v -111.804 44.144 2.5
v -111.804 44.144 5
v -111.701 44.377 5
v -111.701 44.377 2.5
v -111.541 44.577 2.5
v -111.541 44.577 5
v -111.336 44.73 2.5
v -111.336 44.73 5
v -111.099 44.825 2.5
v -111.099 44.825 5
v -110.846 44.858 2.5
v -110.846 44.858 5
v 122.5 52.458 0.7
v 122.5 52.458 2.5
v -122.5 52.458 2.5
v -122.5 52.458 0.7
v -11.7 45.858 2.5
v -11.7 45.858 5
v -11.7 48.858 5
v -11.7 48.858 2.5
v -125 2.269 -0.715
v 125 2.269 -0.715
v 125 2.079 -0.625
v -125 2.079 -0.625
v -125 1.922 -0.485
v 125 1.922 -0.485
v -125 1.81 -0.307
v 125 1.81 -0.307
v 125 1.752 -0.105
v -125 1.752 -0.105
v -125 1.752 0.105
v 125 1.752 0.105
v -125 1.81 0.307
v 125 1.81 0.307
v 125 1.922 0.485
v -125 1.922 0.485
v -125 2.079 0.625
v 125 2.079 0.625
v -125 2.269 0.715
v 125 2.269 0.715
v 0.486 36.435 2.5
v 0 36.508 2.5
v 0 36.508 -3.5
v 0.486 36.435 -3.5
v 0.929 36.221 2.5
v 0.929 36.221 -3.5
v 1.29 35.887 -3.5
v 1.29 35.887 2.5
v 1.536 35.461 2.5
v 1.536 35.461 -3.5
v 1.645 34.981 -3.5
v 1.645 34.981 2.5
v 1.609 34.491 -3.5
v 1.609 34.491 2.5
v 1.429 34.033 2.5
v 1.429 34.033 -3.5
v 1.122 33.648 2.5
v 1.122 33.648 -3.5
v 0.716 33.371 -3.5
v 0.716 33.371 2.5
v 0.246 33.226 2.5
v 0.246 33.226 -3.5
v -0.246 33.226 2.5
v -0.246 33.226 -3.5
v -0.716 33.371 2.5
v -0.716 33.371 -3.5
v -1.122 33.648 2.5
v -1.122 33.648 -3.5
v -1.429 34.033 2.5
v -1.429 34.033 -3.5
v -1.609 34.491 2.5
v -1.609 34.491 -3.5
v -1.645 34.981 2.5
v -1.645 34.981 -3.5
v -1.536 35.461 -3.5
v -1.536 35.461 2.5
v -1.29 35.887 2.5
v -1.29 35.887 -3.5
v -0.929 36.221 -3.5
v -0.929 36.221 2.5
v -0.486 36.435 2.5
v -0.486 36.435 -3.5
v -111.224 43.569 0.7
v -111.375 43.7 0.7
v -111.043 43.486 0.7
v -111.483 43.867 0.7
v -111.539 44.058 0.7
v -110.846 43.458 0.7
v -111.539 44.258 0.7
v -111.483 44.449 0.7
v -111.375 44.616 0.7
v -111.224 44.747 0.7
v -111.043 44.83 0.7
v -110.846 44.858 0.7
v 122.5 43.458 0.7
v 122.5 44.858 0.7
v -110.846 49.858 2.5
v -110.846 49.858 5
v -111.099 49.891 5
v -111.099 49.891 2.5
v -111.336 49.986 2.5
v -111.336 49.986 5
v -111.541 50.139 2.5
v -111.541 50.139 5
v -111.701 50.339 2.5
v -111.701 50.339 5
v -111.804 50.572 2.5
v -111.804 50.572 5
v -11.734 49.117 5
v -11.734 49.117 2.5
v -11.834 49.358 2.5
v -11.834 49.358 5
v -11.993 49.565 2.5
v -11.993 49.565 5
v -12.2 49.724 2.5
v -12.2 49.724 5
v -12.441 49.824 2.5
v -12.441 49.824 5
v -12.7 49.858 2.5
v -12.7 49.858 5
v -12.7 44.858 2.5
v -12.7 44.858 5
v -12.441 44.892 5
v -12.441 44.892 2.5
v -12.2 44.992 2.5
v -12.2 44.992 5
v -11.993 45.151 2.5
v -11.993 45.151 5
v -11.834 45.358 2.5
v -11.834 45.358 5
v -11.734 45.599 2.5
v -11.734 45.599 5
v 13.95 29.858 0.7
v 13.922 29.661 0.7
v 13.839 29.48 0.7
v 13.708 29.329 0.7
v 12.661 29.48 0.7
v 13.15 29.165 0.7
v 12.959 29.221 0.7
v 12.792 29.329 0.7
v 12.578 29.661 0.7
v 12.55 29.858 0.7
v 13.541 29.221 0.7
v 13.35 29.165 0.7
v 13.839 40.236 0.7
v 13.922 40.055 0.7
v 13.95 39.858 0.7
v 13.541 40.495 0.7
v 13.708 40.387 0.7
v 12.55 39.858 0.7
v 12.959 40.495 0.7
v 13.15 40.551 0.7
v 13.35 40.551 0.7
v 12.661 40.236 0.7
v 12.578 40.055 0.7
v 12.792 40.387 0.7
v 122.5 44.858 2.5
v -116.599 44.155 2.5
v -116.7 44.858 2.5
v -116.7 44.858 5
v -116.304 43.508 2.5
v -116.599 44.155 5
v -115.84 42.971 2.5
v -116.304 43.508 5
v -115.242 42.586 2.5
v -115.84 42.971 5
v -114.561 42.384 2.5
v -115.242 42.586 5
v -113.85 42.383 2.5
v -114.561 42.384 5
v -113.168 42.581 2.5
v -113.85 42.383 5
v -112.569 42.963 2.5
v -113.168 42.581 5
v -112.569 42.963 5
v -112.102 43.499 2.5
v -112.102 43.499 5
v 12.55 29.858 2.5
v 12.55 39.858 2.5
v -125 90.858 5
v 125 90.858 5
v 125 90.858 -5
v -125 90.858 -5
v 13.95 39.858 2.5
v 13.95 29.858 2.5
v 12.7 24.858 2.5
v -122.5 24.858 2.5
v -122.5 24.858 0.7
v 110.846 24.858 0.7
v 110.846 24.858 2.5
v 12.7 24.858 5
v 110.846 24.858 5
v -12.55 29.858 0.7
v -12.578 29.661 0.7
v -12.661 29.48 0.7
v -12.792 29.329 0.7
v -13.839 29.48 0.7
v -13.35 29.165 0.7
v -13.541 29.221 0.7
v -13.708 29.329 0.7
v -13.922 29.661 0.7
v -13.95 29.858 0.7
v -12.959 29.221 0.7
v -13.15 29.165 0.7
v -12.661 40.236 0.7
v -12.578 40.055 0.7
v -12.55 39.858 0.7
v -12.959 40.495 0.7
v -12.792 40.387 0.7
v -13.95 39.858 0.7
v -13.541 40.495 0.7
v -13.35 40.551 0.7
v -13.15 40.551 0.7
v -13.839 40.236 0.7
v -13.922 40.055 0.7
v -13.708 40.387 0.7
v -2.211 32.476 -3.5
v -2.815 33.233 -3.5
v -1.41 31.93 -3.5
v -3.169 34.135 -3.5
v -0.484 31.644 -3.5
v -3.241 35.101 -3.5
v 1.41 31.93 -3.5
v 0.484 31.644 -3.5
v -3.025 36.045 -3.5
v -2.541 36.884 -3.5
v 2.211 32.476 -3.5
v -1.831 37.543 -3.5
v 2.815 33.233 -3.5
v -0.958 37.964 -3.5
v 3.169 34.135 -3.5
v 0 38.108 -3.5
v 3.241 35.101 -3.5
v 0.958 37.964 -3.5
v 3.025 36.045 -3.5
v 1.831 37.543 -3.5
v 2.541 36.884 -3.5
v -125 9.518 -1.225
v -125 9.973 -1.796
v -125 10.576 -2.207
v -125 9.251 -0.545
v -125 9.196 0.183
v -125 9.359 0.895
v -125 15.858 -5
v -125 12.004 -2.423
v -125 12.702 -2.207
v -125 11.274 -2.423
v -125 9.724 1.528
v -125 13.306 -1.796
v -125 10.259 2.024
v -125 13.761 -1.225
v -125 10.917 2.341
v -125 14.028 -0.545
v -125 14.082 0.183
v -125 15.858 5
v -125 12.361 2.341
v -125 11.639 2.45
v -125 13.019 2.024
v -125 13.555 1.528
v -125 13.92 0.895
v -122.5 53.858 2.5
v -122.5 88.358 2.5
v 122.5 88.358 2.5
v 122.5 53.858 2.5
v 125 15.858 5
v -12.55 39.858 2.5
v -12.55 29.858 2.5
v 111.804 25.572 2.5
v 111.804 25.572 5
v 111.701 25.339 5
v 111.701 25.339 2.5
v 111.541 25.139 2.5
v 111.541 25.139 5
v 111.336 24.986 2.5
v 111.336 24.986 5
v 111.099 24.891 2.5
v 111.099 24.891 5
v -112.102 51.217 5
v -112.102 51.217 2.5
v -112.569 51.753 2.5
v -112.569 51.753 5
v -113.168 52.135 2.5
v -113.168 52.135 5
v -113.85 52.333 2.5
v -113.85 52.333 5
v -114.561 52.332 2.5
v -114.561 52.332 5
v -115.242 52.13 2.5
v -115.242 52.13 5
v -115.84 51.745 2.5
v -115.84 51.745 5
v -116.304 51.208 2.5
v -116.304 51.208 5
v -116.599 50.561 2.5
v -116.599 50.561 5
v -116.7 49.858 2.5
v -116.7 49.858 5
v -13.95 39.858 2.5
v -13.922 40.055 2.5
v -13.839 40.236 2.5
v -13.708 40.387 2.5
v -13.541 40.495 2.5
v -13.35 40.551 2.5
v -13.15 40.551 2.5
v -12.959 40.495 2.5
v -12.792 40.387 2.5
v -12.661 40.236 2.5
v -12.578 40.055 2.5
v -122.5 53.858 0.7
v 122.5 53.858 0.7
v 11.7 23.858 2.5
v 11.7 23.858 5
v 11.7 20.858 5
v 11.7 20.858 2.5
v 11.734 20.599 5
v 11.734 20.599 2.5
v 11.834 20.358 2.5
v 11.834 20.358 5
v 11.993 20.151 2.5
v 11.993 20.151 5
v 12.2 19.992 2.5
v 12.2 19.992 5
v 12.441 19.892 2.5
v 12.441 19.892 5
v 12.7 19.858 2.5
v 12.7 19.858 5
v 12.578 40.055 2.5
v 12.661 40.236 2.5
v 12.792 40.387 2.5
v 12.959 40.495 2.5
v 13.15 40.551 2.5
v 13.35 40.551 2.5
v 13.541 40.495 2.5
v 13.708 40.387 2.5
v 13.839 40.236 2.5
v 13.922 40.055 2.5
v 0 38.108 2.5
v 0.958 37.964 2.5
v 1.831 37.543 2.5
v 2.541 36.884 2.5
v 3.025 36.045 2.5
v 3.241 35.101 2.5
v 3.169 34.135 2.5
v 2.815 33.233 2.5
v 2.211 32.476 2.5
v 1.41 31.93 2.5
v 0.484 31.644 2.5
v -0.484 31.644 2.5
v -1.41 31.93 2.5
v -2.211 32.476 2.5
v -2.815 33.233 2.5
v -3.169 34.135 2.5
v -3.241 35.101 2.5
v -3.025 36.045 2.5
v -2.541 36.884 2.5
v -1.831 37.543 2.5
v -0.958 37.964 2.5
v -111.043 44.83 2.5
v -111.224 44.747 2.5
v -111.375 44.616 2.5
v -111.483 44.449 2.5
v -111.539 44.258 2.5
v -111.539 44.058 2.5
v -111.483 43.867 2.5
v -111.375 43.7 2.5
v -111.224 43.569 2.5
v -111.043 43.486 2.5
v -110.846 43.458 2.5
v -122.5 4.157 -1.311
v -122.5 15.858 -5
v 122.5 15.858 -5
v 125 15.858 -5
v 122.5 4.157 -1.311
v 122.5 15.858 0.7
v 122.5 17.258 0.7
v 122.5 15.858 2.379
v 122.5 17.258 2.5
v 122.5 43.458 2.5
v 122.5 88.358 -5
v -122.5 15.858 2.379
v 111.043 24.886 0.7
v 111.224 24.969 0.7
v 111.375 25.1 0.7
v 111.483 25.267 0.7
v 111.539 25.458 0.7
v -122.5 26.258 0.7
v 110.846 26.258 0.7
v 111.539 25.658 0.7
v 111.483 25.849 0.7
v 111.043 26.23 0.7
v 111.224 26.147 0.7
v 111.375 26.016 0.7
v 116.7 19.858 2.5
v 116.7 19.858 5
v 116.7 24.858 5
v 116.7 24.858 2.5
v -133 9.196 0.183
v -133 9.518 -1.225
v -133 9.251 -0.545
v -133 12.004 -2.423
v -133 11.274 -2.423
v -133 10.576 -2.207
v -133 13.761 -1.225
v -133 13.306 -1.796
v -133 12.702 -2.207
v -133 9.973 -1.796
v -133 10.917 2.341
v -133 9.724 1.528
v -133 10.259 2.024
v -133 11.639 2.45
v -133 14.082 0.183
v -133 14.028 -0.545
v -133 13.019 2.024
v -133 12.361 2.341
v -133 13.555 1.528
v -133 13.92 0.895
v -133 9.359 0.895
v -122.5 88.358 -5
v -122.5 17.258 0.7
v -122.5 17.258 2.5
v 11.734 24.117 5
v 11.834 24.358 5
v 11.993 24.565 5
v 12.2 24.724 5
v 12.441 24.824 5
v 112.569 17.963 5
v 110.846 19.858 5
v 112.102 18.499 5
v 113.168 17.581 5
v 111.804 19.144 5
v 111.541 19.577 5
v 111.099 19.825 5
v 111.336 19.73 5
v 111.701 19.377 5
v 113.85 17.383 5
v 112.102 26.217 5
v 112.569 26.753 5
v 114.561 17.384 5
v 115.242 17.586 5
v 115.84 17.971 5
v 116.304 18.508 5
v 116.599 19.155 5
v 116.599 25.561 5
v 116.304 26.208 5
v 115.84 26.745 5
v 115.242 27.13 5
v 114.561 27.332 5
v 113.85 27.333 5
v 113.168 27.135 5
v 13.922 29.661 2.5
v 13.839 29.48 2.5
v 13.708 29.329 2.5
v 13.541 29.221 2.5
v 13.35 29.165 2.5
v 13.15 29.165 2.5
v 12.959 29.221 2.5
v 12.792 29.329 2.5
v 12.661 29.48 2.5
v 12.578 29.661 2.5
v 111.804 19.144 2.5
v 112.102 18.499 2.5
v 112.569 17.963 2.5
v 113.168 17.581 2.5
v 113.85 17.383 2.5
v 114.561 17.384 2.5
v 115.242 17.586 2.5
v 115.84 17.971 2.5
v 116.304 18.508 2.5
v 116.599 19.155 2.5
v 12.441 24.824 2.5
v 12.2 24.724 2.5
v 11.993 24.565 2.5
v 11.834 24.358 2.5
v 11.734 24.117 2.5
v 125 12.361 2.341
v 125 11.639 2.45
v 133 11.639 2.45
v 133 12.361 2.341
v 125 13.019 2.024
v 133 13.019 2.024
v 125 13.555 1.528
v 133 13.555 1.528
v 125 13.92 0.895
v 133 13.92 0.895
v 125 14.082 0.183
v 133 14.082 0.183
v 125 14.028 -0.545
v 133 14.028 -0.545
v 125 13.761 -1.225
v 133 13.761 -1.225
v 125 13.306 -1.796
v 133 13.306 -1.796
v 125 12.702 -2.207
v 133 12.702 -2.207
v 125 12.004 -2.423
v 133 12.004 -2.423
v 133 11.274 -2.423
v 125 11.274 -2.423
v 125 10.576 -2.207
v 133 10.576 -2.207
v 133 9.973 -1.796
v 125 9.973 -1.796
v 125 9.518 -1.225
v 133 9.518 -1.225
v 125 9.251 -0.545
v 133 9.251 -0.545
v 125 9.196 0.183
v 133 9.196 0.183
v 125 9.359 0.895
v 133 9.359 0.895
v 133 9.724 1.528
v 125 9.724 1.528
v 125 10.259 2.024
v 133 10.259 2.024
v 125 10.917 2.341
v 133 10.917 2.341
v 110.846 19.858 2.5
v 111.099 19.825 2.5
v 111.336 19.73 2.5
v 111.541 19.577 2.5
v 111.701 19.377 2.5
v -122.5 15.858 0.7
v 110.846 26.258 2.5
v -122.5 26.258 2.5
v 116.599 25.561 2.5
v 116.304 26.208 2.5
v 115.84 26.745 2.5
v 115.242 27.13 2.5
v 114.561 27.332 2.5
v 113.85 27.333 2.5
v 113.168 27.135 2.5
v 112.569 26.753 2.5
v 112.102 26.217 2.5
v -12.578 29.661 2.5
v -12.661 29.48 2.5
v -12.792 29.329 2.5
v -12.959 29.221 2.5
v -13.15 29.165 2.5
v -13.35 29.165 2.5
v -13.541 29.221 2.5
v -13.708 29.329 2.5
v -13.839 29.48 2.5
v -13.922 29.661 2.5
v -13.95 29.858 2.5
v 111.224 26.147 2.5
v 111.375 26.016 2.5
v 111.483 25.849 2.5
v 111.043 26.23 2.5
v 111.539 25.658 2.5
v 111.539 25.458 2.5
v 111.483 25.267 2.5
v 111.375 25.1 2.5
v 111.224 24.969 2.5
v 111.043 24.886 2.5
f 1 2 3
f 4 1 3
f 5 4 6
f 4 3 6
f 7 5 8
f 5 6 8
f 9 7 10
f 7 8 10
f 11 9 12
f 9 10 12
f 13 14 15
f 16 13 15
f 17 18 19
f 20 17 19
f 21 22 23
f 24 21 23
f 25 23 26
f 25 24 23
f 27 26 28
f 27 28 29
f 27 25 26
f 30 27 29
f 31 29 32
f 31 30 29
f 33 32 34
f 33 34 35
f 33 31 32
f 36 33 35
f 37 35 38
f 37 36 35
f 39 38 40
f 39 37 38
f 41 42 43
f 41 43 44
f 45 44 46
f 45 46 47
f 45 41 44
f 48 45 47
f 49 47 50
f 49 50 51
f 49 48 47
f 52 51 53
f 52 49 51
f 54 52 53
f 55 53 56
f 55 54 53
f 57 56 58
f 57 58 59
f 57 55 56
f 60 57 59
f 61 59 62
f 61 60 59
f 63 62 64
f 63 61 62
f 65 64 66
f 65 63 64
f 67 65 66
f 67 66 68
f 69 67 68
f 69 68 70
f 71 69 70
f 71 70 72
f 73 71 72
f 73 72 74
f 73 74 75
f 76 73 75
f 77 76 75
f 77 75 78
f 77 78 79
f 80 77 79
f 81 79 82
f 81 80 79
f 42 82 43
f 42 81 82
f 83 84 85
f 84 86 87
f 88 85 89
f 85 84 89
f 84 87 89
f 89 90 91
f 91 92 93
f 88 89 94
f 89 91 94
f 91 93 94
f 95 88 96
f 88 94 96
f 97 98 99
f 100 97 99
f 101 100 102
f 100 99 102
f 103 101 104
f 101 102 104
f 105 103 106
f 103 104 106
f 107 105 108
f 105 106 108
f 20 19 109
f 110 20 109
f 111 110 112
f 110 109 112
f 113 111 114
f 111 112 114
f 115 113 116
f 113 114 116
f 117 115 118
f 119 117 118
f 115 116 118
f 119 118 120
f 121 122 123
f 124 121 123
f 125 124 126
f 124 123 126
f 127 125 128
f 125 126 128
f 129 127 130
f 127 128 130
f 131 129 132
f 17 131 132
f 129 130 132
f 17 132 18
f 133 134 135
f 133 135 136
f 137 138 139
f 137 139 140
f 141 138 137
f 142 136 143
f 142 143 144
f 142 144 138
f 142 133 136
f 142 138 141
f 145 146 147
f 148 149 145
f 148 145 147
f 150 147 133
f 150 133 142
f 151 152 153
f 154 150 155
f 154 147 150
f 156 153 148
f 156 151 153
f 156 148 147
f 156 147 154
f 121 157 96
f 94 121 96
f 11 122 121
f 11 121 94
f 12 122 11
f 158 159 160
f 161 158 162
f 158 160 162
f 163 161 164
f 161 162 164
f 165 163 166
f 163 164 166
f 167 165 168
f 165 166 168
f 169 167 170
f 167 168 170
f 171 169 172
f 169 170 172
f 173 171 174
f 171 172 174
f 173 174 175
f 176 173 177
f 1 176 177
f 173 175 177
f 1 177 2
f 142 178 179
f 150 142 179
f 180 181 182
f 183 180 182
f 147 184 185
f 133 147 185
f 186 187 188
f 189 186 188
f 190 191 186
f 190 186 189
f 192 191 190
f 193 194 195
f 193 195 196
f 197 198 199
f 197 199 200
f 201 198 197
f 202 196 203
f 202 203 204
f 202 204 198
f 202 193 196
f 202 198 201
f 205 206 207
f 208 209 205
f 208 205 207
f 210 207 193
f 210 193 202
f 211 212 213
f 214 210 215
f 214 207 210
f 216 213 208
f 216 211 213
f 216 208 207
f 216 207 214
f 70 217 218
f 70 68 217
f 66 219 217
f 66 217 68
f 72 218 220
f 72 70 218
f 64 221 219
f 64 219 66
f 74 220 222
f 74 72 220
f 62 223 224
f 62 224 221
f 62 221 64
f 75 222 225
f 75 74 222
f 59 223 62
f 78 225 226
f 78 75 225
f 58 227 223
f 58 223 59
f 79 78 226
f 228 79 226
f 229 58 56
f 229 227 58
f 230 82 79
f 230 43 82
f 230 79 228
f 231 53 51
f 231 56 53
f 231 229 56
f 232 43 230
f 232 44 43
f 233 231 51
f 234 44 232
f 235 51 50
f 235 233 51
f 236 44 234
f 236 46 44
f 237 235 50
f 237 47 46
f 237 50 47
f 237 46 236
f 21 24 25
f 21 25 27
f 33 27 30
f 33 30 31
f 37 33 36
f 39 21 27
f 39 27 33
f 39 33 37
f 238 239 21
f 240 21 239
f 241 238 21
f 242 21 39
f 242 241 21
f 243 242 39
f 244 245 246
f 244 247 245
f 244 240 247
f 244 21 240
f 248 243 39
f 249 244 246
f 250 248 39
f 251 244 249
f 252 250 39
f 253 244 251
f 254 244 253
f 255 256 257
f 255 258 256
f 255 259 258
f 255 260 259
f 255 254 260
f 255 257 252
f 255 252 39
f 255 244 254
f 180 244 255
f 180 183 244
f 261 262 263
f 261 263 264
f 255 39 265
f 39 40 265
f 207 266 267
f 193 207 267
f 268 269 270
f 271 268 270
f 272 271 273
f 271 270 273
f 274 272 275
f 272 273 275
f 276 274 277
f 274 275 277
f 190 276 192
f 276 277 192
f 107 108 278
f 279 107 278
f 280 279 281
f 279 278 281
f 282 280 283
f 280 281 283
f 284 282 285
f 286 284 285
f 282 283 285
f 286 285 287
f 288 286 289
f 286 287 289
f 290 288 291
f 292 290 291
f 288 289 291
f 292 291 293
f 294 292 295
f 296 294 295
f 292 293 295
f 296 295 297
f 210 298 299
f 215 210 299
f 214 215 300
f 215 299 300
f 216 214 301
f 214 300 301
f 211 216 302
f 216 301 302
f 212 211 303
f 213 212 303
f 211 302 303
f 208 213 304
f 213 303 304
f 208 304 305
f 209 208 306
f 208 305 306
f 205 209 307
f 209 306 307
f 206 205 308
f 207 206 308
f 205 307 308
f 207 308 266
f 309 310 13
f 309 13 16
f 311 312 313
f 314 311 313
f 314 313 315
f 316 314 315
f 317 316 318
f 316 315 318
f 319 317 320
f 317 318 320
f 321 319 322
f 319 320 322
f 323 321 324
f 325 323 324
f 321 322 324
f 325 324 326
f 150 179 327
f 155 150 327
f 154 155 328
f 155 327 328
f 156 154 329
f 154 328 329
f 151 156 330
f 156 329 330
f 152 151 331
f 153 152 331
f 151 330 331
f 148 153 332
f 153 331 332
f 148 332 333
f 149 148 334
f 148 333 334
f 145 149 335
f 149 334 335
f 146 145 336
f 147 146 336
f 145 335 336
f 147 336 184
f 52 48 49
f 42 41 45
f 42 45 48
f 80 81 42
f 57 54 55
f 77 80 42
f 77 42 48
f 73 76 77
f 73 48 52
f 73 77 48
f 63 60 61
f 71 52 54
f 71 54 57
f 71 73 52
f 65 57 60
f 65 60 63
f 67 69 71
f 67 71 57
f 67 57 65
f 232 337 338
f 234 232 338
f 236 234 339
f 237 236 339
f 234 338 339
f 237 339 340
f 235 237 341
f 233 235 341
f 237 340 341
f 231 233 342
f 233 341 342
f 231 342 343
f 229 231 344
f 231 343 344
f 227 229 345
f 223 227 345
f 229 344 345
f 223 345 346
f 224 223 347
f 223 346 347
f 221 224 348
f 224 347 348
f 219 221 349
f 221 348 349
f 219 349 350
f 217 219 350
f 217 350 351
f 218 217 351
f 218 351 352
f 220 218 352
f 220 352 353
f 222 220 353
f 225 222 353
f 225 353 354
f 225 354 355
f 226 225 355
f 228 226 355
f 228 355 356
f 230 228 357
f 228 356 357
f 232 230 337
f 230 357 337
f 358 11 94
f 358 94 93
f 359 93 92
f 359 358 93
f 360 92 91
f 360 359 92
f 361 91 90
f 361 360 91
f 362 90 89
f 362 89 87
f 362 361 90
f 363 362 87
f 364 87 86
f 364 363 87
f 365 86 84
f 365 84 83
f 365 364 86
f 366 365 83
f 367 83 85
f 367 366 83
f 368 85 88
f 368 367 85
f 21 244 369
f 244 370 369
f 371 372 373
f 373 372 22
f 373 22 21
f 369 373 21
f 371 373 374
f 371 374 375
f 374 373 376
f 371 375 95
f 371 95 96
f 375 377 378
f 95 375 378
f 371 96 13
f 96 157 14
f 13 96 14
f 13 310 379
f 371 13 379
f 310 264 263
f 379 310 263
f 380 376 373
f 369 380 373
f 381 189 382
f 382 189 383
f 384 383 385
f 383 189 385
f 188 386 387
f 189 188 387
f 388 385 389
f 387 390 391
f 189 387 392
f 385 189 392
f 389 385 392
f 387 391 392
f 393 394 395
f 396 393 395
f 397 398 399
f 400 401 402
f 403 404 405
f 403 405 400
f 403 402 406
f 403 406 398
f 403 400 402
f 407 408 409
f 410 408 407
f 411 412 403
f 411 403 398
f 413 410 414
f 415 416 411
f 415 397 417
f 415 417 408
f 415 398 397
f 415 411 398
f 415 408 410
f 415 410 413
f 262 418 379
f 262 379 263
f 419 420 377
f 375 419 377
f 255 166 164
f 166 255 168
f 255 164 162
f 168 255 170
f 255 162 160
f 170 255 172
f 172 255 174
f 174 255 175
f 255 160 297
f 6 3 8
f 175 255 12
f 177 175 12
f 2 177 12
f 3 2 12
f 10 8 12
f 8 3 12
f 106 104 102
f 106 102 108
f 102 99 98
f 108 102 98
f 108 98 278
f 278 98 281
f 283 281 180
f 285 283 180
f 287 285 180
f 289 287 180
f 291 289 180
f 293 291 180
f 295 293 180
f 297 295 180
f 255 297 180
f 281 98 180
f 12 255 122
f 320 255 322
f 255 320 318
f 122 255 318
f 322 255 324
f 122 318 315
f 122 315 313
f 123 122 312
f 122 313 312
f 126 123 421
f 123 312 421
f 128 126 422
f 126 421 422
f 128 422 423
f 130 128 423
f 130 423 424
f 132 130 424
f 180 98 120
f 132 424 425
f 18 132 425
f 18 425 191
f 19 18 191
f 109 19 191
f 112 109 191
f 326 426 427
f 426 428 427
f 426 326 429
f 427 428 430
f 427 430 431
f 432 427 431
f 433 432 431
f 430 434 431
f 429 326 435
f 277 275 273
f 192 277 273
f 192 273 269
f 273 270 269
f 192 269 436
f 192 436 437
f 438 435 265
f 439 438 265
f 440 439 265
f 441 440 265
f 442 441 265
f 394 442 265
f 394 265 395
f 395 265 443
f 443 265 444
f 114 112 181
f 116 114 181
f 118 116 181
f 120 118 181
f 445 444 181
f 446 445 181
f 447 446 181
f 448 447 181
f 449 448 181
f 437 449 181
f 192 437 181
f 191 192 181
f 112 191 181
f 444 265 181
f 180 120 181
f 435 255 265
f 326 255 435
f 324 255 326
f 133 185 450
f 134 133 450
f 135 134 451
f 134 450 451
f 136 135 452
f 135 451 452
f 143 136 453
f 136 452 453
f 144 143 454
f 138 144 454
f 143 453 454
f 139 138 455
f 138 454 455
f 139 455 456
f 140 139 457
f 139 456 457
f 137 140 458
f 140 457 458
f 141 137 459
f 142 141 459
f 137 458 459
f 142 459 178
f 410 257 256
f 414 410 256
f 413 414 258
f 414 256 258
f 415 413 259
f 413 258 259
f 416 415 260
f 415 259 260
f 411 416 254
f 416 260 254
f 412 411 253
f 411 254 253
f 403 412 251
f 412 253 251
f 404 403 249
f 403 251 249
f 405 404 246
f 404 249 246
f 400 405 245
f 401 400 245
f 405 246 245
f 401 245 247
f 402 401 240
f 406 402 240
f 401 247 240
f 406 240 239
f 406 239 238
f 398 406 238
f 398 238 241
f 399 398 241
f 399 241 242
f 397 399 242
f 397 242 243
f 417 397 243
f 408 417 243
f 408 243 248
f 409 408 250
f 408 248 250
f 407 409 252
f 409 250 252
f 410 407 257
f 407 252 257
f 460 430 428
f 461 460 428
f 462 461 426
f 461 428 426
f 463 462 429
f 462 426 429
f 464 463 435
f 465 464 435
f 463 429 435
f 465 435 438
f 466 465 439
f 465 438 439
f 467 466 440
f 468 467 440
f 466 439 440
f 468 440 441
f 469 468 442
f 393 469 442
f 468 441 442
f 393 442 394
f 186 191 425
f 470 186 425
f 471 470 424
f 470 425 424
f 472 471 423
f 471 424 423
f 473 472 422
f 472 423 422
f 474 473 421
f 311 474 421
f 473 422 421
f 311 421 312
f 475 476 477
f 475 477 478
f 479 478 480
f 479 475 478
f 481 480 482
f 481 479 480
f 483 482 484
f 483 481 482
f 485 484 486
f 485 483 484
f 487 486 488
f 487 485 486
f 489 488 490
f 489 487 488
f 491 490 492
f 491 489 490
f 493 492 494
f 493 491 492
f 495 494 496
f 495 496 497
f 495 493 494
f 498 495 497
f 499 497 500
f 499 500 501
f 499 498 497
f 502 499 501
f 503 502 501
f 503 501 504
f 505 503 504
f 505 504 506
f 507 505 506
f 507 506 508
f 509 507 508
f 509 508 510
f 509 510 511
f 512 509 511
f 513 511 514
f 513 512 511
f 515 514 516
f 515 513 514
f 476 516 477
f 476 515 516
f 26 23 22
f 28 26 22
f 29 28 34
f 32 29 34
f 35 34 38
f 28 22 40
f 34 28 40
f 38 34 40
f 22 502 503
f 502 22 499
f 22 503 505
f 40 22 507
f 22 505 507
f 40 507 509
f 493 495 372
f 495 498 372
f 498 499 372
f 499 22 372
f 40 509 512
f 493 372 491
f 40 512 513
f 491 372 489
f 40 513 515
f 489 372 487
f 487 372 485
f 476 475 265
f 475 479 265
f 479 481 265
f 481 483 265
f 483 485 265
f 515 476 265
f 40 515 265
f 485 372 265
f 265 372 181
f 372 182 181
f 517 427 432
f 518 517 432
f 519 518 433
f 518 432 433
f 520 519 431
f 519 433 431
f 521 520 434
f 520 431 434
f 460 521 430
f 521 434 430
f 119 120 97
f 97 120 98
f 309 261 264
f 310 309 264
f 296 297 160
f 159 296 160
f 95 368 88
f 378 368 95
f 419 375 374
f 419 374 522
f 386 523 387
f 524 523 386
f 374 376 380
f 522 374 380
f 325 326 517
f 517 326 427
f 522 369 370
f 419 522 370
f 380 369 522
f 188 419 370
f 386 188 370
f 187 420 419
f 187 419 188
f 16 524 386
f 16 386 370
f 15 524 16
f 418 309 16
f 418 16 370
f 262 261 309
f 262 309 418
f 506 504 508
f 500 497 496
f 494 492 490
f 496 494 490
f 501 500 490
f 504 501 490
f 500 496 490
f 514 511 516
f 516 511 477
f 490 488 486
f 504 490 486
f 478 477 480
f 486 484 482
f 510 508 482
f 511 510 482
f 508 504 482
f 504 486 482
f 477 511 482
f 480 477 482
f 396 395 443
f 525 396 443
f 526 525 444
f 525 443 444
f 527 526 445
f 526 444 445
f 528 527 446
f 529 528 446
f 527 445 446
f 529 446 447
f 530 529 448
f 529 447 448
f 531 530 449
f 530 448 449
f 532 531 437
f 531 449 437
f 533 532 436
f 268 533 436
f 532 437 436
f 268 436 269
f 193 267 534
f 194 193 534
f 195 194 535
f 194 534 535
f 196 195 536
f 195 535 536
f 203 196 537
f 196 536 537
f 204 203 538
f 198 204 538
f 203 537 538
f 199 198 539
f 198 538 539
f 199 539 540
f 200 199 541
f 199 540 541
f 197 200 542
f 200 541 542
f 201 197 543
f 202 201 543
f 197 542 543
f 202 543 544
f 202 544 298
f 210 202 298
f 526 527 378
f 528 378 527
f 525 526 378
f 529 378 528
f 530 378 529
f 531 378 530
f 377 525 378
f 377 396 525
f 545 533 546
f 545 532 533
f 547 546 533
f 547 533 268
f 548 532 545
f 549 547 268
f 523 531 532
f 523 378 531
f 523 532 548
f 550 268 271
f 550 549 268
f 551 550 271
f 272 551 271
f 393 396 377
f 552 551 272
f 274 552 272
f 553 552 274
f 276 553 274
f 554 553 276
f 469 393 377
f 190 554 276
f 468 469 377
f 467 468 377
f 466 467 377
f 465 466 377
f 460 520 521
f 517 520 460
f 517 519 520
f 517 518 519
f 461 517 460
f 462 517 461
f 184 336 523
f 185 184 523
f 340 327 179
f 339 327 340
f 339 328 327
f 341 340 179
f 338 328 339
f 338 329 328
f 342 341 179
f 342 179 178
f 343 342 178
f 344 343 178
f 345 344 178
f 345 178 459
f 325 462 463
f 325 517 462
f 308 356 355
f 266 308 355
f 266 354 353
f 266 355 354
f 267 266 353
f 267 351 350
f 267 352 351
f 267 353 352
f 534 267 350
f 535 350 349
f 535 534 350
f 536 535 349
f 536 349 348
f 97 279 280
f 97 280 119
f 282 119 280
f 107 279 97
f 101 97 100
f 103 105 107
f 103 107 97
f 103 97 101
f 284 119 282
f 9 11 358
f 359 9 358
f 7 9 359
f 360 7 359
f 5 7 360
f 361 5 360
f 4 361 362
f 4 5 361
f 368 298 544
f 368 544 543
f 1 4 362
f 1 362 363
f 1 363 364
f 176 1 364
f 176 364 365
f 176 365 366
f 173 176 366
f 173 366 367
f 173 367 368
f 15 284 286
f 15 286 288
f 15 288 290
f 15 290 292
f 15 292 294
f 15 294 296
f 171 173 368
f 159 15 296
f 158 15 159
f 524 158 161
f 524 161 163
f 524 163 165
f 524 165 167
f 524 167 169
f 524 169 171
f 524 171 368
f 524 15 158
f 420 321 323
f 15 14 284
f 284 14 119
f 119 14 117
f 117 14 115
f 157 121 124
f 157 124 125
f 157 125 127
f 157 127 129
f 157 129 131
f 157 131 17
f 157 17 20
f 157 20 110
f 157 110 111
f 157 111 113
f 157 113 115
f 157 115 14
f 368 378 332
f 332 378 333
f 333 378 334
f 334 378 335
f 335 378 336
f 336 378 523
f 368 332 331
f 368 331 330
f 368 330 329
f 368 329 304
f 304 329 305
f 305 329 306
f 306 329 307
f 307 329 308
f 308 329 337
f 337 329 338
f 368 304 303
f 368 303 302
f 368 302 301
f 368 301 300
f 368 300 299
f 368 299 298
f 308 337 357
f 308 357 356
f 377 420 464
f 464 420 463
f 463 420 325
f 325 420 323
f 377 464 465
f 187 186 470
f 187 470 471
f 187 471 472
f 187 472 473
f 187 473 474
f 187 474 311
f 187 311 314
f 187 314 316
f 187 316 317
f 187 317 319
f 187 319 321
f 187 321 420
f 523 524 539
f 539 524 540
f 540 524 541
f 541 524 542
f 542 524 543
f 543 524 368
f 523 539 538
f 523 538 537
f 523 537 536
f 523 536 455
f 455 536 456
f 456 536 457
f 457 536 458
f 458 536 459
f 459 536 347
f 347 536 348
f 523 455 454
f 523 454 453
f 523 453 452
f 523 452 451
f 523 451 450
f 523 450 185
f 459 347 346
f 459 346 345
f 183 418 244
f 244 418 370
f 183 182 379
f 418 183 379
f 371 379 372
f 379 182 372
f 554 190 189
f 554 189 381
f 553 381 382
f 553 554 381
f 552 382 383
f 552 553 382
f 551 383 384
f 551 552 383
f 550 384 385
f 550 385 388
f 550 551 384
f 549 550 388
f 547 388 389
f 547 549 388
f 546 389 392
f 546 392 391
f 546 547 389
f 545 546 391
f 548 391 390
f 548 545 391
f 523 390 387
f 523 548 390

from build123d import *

# Parameters (mm, degrees)
BOSS_EXTRU_1_DEPTH           = 125
ESQUISSE2_R                  = 2.45
BOSS_EXTRU_2_DEPTH           = 8
CONG_1_R                     = 0.75
COQUE1_START                 = -122.5
COQUE1_DEPTH                 = 245
ENL_V_MAT_EXTRU_1_DEPTH      = 162.382066666
ESQUISSE4_R                  = 3.25
ESQUISSE4_R_2                = 1.65
BOSS_EXTRU_3_DEPTH           = 6
R_P_TITION_CIRCULAIRE1_COUNT = 2
BOSS_EXTRU_4_DEPTH           = 1.8


# Read off the part's stored shape, not the designer's step: Coque1
with BuildPart() as part:
    # Esquisse1 → Boss.-Extru.1 (new body)
    with BuildSketch(Plane(origin=(0, 0, 0), x_dir=(0, 0, -1), z_dir=(1, 0, 0))):
        Polygon((5, 15.857974012), (0, 0), (-5, 15.857974012), (-5, 90.857974012), (5, 90.857974012), align=None)
    boss_extru_1 = extrude(amount=BOSS_EXTRU_1_DEPTH)

    # Esquisse2 → Boss.-Extru.2 (add)
    with BuildSketch(Plane.ZY.offset(-125)):
        with Locations((0, 11.639283332)):
            Circle(ESQUISSE2_R)
    boss_extru_2 = extrude(amount=-BOSS_EXTRU_2_DEPTH)

    # Symétrie1: Boss.-Extru.1, Boss.-Extru.2 across plane
    add(boss_extru_1.mirror(Plane(origin=(0, 0, 0), x_dir=(0, 0, 1), z_dir=(1, 0, 0))))
    add(boss_extru_2.mirror(Plane(origin=(0, 0, 0), x_dir=(0, 0, 1), z_dir=(1, 0, 0))))

    # Congé1
    cong_1_edges = [part.edges().sort_by_distance(p)[0] for p in [
        (0, 0, 0),
    ]]
    fillet(cong_1_edges, radius=CONG_1_R)

    # Coque1 outline → Coque1 (cut)
    with BuildSketch(Plane.YZ.offset(COQUE1_START)):
        Polygon((16.242760814, 2.5), (4.156886904, -1.310661406), (15.857974012, -5), (88.357974012, -5), (88.357974012, 2.5), align=None)
    extrude(amount=COQUE1_DEPTH, mode=Mode.SUBTRACT)

    # Esquisse3 → Enlèv. mat.-Extru.1 (cut, through all)
    with BuildSketch(Plane.XY.offset(5)):
        with BuildLine():
            Line((116.7, 19.857974012), (116.7, 24.857974012))
            ThreePointArc((116.7, 24.857974012), (114.560923955, 27.331783604), (111.804212881, 25.572259726))
            ThreePointArc((111.804212881, 25.572259726), (111.443512338, 25.056190286), (110.845898034, 24.857974012))
            Line((110.845898034, 24.857974012), (12.7, 24.857974012))
            ThreePointArc((12.7, 24.857974012), (11.992893219, 24.565080793), (11.7, 23.857974012))
            Line((11.7, 23.857974012), (11.7, 20.857974012))
            ThreePointArc((11.7, 20.857974012), (11.992893219, 20.150867231), (12.7, 19.857974012))
            Line((12.7, 19.857974012), (110.845898034, 19.857974012))
            ThreePointArc((110.845898034, 19.857974012), (111.443512338, 19.659757738), (111.804212881, 19.143688298))
            ThreePointArc((111.804212881, 19.143688298), (114.560923955, 17.38416442), (116.7, 19.857974012))
        make_face()
    enl_v_mat_extru_1 = extrude(amount=-ENL_V_MAT_EXTRU_1_DEPTH, mode=Mode.SUBTRACT)

    # Esquisse4 → Boss.-Extru.3 (add)
    with BuildSketch(Plane(origin=(0, 0, 2.5), x_dir=(-1, 0, 0), z_dir=(0, 0, -1))):
        with Locations(Location((0, 34.857974012, 0), (0, 0, 90))):
            Circle(ESQUISSE4_R)
        with Locations(Location((0, 34.857974012, 0), (0, 0, 90))):
            Circle(ESQUISSE4_R_2, mode=Mode.SUBTRACT)
    extrude(amount=BOSS_EXTRU_3_DEPTH)

    # Répétition circulaire1: Enlèv. mat.-Extru.1 ×2 about axis
    r_p_tition_circulaire1_axis = Axis((0, 34.857974012, 0), (0, 0, 1))
    for i in range(1, R_P_TITION_CIRCULAIRE1_COUNT):
        add(enl_v_mat_extru_1.rotate(r_p_tition_circulaire1_axis, i * 360 / R_P_TITION_CIRCULAIRE1_COUNT), mode=Mode.SUBTRACT)

    # Esquisse5 → Boss.-Extru.4 (add)
    with BuildSketch(Plane(origin=(0, 0, 2.5), x_dir=(-1, 0, 0), z_dir=(0, 0, -1))):
        with BuildLine():
            Line((-13.95, 39.857974012), (-13.95, 29.857974012))
            ThreePointArc((-13.95, 29.857974012), (-13.25, 29.157974012), (-12.55, 29.857974012))
            Line((-12.55, 29.857974012), (-12.55, 39.857974012))
            ThreePointArc((-12.55, 39.857974012), (-13.25, 40.557974012), (-13.95, 39.857974012))
        make_face()
        with BuildLine():
            Line((12.55, 39.857974012), (12.55, 29.857974012))
            ThreePointArc((12.55, 29.857974012), (13.25, 29.157974012), (13.95, 29.857974012))
            Line((13.95, 29.857974012), (13.95, 39.857974012))
            ThreePointArc((13.95, 39.857974012), (13.25, 40.557974012), (12.55, 39.857974012))
        make_face()
        with BuildLine():
            Line((-12.7, 26.257974012), (122.5, 26.257974012))
            ThreePointArc((122.5, 26.257974012), (123.2, 25.557974012), (122.5, 24.857974012))
            Line((122.5, 24.857974012), (-12.7, 24.857974012))
            Line((-12.7, 24.857974012), (-110.845898034, 24.857974012))
            ThreePointArc((-110.845898034, 24.857974012), (-111.545898034, 25.557974012), (-110.845898034, 26.257974012))
            Line((-110.845898034, 26.257974012), (-12.7, 26.257974012))
        make_face()
        with BuildLine():
            Line((-122.5, 15.857974012), (122.5, 15.857974012))
            ThreePointArc((122.5, 15.857974012), (123.2, 16.557974012), (122.5, 17.257974012))
            Line((122.5, 17.257974012), (-122.5, 17.257974012))
            ThreePointArc((-122.5, 17.257974012), (-123.2, 16.557974012), (-122.5, 15.857974012))
        make_face()
        with BuildLine():
            Line((12.7, 43.457974012), (-122.5, 43.457974012))
            ThreePointArc((-122.5, 43.457974012), (-123.2, 44.157974012), (-122.5, 44.857974012))
            Line((-122.5, 44.857974012), (12.7, 44.857974012))
            Line((12.7, 44.857974012), (110.845898034, 44.857974012))
            ThreePointArc((110.845898034, 44.857974012), (111.545898034, 44.157974012), (110.845898034, 43.457974012))
            Line((110.845898034, 43.457974012), (12.7, 43.457974012))
        make_face()
        with BuildLine():
            Line((-122.5, 52.457974012), (122.5, 52.457974012))
            ThreePointArc((122.5, 52.457974012), (123.2, 53.157974012), (122.5, 53.857974012))
            Line((122.5, 53.857974012), (-122.5, 53.857974012))
            ThreePointArc((-122.5, 53.857974012), (-123.2, 53.157974012), (-122.5, 52.457974012))
        make_face()
    extrude(amount=BOSS_EXTRU_4_DEPTH)


solid = part.part
